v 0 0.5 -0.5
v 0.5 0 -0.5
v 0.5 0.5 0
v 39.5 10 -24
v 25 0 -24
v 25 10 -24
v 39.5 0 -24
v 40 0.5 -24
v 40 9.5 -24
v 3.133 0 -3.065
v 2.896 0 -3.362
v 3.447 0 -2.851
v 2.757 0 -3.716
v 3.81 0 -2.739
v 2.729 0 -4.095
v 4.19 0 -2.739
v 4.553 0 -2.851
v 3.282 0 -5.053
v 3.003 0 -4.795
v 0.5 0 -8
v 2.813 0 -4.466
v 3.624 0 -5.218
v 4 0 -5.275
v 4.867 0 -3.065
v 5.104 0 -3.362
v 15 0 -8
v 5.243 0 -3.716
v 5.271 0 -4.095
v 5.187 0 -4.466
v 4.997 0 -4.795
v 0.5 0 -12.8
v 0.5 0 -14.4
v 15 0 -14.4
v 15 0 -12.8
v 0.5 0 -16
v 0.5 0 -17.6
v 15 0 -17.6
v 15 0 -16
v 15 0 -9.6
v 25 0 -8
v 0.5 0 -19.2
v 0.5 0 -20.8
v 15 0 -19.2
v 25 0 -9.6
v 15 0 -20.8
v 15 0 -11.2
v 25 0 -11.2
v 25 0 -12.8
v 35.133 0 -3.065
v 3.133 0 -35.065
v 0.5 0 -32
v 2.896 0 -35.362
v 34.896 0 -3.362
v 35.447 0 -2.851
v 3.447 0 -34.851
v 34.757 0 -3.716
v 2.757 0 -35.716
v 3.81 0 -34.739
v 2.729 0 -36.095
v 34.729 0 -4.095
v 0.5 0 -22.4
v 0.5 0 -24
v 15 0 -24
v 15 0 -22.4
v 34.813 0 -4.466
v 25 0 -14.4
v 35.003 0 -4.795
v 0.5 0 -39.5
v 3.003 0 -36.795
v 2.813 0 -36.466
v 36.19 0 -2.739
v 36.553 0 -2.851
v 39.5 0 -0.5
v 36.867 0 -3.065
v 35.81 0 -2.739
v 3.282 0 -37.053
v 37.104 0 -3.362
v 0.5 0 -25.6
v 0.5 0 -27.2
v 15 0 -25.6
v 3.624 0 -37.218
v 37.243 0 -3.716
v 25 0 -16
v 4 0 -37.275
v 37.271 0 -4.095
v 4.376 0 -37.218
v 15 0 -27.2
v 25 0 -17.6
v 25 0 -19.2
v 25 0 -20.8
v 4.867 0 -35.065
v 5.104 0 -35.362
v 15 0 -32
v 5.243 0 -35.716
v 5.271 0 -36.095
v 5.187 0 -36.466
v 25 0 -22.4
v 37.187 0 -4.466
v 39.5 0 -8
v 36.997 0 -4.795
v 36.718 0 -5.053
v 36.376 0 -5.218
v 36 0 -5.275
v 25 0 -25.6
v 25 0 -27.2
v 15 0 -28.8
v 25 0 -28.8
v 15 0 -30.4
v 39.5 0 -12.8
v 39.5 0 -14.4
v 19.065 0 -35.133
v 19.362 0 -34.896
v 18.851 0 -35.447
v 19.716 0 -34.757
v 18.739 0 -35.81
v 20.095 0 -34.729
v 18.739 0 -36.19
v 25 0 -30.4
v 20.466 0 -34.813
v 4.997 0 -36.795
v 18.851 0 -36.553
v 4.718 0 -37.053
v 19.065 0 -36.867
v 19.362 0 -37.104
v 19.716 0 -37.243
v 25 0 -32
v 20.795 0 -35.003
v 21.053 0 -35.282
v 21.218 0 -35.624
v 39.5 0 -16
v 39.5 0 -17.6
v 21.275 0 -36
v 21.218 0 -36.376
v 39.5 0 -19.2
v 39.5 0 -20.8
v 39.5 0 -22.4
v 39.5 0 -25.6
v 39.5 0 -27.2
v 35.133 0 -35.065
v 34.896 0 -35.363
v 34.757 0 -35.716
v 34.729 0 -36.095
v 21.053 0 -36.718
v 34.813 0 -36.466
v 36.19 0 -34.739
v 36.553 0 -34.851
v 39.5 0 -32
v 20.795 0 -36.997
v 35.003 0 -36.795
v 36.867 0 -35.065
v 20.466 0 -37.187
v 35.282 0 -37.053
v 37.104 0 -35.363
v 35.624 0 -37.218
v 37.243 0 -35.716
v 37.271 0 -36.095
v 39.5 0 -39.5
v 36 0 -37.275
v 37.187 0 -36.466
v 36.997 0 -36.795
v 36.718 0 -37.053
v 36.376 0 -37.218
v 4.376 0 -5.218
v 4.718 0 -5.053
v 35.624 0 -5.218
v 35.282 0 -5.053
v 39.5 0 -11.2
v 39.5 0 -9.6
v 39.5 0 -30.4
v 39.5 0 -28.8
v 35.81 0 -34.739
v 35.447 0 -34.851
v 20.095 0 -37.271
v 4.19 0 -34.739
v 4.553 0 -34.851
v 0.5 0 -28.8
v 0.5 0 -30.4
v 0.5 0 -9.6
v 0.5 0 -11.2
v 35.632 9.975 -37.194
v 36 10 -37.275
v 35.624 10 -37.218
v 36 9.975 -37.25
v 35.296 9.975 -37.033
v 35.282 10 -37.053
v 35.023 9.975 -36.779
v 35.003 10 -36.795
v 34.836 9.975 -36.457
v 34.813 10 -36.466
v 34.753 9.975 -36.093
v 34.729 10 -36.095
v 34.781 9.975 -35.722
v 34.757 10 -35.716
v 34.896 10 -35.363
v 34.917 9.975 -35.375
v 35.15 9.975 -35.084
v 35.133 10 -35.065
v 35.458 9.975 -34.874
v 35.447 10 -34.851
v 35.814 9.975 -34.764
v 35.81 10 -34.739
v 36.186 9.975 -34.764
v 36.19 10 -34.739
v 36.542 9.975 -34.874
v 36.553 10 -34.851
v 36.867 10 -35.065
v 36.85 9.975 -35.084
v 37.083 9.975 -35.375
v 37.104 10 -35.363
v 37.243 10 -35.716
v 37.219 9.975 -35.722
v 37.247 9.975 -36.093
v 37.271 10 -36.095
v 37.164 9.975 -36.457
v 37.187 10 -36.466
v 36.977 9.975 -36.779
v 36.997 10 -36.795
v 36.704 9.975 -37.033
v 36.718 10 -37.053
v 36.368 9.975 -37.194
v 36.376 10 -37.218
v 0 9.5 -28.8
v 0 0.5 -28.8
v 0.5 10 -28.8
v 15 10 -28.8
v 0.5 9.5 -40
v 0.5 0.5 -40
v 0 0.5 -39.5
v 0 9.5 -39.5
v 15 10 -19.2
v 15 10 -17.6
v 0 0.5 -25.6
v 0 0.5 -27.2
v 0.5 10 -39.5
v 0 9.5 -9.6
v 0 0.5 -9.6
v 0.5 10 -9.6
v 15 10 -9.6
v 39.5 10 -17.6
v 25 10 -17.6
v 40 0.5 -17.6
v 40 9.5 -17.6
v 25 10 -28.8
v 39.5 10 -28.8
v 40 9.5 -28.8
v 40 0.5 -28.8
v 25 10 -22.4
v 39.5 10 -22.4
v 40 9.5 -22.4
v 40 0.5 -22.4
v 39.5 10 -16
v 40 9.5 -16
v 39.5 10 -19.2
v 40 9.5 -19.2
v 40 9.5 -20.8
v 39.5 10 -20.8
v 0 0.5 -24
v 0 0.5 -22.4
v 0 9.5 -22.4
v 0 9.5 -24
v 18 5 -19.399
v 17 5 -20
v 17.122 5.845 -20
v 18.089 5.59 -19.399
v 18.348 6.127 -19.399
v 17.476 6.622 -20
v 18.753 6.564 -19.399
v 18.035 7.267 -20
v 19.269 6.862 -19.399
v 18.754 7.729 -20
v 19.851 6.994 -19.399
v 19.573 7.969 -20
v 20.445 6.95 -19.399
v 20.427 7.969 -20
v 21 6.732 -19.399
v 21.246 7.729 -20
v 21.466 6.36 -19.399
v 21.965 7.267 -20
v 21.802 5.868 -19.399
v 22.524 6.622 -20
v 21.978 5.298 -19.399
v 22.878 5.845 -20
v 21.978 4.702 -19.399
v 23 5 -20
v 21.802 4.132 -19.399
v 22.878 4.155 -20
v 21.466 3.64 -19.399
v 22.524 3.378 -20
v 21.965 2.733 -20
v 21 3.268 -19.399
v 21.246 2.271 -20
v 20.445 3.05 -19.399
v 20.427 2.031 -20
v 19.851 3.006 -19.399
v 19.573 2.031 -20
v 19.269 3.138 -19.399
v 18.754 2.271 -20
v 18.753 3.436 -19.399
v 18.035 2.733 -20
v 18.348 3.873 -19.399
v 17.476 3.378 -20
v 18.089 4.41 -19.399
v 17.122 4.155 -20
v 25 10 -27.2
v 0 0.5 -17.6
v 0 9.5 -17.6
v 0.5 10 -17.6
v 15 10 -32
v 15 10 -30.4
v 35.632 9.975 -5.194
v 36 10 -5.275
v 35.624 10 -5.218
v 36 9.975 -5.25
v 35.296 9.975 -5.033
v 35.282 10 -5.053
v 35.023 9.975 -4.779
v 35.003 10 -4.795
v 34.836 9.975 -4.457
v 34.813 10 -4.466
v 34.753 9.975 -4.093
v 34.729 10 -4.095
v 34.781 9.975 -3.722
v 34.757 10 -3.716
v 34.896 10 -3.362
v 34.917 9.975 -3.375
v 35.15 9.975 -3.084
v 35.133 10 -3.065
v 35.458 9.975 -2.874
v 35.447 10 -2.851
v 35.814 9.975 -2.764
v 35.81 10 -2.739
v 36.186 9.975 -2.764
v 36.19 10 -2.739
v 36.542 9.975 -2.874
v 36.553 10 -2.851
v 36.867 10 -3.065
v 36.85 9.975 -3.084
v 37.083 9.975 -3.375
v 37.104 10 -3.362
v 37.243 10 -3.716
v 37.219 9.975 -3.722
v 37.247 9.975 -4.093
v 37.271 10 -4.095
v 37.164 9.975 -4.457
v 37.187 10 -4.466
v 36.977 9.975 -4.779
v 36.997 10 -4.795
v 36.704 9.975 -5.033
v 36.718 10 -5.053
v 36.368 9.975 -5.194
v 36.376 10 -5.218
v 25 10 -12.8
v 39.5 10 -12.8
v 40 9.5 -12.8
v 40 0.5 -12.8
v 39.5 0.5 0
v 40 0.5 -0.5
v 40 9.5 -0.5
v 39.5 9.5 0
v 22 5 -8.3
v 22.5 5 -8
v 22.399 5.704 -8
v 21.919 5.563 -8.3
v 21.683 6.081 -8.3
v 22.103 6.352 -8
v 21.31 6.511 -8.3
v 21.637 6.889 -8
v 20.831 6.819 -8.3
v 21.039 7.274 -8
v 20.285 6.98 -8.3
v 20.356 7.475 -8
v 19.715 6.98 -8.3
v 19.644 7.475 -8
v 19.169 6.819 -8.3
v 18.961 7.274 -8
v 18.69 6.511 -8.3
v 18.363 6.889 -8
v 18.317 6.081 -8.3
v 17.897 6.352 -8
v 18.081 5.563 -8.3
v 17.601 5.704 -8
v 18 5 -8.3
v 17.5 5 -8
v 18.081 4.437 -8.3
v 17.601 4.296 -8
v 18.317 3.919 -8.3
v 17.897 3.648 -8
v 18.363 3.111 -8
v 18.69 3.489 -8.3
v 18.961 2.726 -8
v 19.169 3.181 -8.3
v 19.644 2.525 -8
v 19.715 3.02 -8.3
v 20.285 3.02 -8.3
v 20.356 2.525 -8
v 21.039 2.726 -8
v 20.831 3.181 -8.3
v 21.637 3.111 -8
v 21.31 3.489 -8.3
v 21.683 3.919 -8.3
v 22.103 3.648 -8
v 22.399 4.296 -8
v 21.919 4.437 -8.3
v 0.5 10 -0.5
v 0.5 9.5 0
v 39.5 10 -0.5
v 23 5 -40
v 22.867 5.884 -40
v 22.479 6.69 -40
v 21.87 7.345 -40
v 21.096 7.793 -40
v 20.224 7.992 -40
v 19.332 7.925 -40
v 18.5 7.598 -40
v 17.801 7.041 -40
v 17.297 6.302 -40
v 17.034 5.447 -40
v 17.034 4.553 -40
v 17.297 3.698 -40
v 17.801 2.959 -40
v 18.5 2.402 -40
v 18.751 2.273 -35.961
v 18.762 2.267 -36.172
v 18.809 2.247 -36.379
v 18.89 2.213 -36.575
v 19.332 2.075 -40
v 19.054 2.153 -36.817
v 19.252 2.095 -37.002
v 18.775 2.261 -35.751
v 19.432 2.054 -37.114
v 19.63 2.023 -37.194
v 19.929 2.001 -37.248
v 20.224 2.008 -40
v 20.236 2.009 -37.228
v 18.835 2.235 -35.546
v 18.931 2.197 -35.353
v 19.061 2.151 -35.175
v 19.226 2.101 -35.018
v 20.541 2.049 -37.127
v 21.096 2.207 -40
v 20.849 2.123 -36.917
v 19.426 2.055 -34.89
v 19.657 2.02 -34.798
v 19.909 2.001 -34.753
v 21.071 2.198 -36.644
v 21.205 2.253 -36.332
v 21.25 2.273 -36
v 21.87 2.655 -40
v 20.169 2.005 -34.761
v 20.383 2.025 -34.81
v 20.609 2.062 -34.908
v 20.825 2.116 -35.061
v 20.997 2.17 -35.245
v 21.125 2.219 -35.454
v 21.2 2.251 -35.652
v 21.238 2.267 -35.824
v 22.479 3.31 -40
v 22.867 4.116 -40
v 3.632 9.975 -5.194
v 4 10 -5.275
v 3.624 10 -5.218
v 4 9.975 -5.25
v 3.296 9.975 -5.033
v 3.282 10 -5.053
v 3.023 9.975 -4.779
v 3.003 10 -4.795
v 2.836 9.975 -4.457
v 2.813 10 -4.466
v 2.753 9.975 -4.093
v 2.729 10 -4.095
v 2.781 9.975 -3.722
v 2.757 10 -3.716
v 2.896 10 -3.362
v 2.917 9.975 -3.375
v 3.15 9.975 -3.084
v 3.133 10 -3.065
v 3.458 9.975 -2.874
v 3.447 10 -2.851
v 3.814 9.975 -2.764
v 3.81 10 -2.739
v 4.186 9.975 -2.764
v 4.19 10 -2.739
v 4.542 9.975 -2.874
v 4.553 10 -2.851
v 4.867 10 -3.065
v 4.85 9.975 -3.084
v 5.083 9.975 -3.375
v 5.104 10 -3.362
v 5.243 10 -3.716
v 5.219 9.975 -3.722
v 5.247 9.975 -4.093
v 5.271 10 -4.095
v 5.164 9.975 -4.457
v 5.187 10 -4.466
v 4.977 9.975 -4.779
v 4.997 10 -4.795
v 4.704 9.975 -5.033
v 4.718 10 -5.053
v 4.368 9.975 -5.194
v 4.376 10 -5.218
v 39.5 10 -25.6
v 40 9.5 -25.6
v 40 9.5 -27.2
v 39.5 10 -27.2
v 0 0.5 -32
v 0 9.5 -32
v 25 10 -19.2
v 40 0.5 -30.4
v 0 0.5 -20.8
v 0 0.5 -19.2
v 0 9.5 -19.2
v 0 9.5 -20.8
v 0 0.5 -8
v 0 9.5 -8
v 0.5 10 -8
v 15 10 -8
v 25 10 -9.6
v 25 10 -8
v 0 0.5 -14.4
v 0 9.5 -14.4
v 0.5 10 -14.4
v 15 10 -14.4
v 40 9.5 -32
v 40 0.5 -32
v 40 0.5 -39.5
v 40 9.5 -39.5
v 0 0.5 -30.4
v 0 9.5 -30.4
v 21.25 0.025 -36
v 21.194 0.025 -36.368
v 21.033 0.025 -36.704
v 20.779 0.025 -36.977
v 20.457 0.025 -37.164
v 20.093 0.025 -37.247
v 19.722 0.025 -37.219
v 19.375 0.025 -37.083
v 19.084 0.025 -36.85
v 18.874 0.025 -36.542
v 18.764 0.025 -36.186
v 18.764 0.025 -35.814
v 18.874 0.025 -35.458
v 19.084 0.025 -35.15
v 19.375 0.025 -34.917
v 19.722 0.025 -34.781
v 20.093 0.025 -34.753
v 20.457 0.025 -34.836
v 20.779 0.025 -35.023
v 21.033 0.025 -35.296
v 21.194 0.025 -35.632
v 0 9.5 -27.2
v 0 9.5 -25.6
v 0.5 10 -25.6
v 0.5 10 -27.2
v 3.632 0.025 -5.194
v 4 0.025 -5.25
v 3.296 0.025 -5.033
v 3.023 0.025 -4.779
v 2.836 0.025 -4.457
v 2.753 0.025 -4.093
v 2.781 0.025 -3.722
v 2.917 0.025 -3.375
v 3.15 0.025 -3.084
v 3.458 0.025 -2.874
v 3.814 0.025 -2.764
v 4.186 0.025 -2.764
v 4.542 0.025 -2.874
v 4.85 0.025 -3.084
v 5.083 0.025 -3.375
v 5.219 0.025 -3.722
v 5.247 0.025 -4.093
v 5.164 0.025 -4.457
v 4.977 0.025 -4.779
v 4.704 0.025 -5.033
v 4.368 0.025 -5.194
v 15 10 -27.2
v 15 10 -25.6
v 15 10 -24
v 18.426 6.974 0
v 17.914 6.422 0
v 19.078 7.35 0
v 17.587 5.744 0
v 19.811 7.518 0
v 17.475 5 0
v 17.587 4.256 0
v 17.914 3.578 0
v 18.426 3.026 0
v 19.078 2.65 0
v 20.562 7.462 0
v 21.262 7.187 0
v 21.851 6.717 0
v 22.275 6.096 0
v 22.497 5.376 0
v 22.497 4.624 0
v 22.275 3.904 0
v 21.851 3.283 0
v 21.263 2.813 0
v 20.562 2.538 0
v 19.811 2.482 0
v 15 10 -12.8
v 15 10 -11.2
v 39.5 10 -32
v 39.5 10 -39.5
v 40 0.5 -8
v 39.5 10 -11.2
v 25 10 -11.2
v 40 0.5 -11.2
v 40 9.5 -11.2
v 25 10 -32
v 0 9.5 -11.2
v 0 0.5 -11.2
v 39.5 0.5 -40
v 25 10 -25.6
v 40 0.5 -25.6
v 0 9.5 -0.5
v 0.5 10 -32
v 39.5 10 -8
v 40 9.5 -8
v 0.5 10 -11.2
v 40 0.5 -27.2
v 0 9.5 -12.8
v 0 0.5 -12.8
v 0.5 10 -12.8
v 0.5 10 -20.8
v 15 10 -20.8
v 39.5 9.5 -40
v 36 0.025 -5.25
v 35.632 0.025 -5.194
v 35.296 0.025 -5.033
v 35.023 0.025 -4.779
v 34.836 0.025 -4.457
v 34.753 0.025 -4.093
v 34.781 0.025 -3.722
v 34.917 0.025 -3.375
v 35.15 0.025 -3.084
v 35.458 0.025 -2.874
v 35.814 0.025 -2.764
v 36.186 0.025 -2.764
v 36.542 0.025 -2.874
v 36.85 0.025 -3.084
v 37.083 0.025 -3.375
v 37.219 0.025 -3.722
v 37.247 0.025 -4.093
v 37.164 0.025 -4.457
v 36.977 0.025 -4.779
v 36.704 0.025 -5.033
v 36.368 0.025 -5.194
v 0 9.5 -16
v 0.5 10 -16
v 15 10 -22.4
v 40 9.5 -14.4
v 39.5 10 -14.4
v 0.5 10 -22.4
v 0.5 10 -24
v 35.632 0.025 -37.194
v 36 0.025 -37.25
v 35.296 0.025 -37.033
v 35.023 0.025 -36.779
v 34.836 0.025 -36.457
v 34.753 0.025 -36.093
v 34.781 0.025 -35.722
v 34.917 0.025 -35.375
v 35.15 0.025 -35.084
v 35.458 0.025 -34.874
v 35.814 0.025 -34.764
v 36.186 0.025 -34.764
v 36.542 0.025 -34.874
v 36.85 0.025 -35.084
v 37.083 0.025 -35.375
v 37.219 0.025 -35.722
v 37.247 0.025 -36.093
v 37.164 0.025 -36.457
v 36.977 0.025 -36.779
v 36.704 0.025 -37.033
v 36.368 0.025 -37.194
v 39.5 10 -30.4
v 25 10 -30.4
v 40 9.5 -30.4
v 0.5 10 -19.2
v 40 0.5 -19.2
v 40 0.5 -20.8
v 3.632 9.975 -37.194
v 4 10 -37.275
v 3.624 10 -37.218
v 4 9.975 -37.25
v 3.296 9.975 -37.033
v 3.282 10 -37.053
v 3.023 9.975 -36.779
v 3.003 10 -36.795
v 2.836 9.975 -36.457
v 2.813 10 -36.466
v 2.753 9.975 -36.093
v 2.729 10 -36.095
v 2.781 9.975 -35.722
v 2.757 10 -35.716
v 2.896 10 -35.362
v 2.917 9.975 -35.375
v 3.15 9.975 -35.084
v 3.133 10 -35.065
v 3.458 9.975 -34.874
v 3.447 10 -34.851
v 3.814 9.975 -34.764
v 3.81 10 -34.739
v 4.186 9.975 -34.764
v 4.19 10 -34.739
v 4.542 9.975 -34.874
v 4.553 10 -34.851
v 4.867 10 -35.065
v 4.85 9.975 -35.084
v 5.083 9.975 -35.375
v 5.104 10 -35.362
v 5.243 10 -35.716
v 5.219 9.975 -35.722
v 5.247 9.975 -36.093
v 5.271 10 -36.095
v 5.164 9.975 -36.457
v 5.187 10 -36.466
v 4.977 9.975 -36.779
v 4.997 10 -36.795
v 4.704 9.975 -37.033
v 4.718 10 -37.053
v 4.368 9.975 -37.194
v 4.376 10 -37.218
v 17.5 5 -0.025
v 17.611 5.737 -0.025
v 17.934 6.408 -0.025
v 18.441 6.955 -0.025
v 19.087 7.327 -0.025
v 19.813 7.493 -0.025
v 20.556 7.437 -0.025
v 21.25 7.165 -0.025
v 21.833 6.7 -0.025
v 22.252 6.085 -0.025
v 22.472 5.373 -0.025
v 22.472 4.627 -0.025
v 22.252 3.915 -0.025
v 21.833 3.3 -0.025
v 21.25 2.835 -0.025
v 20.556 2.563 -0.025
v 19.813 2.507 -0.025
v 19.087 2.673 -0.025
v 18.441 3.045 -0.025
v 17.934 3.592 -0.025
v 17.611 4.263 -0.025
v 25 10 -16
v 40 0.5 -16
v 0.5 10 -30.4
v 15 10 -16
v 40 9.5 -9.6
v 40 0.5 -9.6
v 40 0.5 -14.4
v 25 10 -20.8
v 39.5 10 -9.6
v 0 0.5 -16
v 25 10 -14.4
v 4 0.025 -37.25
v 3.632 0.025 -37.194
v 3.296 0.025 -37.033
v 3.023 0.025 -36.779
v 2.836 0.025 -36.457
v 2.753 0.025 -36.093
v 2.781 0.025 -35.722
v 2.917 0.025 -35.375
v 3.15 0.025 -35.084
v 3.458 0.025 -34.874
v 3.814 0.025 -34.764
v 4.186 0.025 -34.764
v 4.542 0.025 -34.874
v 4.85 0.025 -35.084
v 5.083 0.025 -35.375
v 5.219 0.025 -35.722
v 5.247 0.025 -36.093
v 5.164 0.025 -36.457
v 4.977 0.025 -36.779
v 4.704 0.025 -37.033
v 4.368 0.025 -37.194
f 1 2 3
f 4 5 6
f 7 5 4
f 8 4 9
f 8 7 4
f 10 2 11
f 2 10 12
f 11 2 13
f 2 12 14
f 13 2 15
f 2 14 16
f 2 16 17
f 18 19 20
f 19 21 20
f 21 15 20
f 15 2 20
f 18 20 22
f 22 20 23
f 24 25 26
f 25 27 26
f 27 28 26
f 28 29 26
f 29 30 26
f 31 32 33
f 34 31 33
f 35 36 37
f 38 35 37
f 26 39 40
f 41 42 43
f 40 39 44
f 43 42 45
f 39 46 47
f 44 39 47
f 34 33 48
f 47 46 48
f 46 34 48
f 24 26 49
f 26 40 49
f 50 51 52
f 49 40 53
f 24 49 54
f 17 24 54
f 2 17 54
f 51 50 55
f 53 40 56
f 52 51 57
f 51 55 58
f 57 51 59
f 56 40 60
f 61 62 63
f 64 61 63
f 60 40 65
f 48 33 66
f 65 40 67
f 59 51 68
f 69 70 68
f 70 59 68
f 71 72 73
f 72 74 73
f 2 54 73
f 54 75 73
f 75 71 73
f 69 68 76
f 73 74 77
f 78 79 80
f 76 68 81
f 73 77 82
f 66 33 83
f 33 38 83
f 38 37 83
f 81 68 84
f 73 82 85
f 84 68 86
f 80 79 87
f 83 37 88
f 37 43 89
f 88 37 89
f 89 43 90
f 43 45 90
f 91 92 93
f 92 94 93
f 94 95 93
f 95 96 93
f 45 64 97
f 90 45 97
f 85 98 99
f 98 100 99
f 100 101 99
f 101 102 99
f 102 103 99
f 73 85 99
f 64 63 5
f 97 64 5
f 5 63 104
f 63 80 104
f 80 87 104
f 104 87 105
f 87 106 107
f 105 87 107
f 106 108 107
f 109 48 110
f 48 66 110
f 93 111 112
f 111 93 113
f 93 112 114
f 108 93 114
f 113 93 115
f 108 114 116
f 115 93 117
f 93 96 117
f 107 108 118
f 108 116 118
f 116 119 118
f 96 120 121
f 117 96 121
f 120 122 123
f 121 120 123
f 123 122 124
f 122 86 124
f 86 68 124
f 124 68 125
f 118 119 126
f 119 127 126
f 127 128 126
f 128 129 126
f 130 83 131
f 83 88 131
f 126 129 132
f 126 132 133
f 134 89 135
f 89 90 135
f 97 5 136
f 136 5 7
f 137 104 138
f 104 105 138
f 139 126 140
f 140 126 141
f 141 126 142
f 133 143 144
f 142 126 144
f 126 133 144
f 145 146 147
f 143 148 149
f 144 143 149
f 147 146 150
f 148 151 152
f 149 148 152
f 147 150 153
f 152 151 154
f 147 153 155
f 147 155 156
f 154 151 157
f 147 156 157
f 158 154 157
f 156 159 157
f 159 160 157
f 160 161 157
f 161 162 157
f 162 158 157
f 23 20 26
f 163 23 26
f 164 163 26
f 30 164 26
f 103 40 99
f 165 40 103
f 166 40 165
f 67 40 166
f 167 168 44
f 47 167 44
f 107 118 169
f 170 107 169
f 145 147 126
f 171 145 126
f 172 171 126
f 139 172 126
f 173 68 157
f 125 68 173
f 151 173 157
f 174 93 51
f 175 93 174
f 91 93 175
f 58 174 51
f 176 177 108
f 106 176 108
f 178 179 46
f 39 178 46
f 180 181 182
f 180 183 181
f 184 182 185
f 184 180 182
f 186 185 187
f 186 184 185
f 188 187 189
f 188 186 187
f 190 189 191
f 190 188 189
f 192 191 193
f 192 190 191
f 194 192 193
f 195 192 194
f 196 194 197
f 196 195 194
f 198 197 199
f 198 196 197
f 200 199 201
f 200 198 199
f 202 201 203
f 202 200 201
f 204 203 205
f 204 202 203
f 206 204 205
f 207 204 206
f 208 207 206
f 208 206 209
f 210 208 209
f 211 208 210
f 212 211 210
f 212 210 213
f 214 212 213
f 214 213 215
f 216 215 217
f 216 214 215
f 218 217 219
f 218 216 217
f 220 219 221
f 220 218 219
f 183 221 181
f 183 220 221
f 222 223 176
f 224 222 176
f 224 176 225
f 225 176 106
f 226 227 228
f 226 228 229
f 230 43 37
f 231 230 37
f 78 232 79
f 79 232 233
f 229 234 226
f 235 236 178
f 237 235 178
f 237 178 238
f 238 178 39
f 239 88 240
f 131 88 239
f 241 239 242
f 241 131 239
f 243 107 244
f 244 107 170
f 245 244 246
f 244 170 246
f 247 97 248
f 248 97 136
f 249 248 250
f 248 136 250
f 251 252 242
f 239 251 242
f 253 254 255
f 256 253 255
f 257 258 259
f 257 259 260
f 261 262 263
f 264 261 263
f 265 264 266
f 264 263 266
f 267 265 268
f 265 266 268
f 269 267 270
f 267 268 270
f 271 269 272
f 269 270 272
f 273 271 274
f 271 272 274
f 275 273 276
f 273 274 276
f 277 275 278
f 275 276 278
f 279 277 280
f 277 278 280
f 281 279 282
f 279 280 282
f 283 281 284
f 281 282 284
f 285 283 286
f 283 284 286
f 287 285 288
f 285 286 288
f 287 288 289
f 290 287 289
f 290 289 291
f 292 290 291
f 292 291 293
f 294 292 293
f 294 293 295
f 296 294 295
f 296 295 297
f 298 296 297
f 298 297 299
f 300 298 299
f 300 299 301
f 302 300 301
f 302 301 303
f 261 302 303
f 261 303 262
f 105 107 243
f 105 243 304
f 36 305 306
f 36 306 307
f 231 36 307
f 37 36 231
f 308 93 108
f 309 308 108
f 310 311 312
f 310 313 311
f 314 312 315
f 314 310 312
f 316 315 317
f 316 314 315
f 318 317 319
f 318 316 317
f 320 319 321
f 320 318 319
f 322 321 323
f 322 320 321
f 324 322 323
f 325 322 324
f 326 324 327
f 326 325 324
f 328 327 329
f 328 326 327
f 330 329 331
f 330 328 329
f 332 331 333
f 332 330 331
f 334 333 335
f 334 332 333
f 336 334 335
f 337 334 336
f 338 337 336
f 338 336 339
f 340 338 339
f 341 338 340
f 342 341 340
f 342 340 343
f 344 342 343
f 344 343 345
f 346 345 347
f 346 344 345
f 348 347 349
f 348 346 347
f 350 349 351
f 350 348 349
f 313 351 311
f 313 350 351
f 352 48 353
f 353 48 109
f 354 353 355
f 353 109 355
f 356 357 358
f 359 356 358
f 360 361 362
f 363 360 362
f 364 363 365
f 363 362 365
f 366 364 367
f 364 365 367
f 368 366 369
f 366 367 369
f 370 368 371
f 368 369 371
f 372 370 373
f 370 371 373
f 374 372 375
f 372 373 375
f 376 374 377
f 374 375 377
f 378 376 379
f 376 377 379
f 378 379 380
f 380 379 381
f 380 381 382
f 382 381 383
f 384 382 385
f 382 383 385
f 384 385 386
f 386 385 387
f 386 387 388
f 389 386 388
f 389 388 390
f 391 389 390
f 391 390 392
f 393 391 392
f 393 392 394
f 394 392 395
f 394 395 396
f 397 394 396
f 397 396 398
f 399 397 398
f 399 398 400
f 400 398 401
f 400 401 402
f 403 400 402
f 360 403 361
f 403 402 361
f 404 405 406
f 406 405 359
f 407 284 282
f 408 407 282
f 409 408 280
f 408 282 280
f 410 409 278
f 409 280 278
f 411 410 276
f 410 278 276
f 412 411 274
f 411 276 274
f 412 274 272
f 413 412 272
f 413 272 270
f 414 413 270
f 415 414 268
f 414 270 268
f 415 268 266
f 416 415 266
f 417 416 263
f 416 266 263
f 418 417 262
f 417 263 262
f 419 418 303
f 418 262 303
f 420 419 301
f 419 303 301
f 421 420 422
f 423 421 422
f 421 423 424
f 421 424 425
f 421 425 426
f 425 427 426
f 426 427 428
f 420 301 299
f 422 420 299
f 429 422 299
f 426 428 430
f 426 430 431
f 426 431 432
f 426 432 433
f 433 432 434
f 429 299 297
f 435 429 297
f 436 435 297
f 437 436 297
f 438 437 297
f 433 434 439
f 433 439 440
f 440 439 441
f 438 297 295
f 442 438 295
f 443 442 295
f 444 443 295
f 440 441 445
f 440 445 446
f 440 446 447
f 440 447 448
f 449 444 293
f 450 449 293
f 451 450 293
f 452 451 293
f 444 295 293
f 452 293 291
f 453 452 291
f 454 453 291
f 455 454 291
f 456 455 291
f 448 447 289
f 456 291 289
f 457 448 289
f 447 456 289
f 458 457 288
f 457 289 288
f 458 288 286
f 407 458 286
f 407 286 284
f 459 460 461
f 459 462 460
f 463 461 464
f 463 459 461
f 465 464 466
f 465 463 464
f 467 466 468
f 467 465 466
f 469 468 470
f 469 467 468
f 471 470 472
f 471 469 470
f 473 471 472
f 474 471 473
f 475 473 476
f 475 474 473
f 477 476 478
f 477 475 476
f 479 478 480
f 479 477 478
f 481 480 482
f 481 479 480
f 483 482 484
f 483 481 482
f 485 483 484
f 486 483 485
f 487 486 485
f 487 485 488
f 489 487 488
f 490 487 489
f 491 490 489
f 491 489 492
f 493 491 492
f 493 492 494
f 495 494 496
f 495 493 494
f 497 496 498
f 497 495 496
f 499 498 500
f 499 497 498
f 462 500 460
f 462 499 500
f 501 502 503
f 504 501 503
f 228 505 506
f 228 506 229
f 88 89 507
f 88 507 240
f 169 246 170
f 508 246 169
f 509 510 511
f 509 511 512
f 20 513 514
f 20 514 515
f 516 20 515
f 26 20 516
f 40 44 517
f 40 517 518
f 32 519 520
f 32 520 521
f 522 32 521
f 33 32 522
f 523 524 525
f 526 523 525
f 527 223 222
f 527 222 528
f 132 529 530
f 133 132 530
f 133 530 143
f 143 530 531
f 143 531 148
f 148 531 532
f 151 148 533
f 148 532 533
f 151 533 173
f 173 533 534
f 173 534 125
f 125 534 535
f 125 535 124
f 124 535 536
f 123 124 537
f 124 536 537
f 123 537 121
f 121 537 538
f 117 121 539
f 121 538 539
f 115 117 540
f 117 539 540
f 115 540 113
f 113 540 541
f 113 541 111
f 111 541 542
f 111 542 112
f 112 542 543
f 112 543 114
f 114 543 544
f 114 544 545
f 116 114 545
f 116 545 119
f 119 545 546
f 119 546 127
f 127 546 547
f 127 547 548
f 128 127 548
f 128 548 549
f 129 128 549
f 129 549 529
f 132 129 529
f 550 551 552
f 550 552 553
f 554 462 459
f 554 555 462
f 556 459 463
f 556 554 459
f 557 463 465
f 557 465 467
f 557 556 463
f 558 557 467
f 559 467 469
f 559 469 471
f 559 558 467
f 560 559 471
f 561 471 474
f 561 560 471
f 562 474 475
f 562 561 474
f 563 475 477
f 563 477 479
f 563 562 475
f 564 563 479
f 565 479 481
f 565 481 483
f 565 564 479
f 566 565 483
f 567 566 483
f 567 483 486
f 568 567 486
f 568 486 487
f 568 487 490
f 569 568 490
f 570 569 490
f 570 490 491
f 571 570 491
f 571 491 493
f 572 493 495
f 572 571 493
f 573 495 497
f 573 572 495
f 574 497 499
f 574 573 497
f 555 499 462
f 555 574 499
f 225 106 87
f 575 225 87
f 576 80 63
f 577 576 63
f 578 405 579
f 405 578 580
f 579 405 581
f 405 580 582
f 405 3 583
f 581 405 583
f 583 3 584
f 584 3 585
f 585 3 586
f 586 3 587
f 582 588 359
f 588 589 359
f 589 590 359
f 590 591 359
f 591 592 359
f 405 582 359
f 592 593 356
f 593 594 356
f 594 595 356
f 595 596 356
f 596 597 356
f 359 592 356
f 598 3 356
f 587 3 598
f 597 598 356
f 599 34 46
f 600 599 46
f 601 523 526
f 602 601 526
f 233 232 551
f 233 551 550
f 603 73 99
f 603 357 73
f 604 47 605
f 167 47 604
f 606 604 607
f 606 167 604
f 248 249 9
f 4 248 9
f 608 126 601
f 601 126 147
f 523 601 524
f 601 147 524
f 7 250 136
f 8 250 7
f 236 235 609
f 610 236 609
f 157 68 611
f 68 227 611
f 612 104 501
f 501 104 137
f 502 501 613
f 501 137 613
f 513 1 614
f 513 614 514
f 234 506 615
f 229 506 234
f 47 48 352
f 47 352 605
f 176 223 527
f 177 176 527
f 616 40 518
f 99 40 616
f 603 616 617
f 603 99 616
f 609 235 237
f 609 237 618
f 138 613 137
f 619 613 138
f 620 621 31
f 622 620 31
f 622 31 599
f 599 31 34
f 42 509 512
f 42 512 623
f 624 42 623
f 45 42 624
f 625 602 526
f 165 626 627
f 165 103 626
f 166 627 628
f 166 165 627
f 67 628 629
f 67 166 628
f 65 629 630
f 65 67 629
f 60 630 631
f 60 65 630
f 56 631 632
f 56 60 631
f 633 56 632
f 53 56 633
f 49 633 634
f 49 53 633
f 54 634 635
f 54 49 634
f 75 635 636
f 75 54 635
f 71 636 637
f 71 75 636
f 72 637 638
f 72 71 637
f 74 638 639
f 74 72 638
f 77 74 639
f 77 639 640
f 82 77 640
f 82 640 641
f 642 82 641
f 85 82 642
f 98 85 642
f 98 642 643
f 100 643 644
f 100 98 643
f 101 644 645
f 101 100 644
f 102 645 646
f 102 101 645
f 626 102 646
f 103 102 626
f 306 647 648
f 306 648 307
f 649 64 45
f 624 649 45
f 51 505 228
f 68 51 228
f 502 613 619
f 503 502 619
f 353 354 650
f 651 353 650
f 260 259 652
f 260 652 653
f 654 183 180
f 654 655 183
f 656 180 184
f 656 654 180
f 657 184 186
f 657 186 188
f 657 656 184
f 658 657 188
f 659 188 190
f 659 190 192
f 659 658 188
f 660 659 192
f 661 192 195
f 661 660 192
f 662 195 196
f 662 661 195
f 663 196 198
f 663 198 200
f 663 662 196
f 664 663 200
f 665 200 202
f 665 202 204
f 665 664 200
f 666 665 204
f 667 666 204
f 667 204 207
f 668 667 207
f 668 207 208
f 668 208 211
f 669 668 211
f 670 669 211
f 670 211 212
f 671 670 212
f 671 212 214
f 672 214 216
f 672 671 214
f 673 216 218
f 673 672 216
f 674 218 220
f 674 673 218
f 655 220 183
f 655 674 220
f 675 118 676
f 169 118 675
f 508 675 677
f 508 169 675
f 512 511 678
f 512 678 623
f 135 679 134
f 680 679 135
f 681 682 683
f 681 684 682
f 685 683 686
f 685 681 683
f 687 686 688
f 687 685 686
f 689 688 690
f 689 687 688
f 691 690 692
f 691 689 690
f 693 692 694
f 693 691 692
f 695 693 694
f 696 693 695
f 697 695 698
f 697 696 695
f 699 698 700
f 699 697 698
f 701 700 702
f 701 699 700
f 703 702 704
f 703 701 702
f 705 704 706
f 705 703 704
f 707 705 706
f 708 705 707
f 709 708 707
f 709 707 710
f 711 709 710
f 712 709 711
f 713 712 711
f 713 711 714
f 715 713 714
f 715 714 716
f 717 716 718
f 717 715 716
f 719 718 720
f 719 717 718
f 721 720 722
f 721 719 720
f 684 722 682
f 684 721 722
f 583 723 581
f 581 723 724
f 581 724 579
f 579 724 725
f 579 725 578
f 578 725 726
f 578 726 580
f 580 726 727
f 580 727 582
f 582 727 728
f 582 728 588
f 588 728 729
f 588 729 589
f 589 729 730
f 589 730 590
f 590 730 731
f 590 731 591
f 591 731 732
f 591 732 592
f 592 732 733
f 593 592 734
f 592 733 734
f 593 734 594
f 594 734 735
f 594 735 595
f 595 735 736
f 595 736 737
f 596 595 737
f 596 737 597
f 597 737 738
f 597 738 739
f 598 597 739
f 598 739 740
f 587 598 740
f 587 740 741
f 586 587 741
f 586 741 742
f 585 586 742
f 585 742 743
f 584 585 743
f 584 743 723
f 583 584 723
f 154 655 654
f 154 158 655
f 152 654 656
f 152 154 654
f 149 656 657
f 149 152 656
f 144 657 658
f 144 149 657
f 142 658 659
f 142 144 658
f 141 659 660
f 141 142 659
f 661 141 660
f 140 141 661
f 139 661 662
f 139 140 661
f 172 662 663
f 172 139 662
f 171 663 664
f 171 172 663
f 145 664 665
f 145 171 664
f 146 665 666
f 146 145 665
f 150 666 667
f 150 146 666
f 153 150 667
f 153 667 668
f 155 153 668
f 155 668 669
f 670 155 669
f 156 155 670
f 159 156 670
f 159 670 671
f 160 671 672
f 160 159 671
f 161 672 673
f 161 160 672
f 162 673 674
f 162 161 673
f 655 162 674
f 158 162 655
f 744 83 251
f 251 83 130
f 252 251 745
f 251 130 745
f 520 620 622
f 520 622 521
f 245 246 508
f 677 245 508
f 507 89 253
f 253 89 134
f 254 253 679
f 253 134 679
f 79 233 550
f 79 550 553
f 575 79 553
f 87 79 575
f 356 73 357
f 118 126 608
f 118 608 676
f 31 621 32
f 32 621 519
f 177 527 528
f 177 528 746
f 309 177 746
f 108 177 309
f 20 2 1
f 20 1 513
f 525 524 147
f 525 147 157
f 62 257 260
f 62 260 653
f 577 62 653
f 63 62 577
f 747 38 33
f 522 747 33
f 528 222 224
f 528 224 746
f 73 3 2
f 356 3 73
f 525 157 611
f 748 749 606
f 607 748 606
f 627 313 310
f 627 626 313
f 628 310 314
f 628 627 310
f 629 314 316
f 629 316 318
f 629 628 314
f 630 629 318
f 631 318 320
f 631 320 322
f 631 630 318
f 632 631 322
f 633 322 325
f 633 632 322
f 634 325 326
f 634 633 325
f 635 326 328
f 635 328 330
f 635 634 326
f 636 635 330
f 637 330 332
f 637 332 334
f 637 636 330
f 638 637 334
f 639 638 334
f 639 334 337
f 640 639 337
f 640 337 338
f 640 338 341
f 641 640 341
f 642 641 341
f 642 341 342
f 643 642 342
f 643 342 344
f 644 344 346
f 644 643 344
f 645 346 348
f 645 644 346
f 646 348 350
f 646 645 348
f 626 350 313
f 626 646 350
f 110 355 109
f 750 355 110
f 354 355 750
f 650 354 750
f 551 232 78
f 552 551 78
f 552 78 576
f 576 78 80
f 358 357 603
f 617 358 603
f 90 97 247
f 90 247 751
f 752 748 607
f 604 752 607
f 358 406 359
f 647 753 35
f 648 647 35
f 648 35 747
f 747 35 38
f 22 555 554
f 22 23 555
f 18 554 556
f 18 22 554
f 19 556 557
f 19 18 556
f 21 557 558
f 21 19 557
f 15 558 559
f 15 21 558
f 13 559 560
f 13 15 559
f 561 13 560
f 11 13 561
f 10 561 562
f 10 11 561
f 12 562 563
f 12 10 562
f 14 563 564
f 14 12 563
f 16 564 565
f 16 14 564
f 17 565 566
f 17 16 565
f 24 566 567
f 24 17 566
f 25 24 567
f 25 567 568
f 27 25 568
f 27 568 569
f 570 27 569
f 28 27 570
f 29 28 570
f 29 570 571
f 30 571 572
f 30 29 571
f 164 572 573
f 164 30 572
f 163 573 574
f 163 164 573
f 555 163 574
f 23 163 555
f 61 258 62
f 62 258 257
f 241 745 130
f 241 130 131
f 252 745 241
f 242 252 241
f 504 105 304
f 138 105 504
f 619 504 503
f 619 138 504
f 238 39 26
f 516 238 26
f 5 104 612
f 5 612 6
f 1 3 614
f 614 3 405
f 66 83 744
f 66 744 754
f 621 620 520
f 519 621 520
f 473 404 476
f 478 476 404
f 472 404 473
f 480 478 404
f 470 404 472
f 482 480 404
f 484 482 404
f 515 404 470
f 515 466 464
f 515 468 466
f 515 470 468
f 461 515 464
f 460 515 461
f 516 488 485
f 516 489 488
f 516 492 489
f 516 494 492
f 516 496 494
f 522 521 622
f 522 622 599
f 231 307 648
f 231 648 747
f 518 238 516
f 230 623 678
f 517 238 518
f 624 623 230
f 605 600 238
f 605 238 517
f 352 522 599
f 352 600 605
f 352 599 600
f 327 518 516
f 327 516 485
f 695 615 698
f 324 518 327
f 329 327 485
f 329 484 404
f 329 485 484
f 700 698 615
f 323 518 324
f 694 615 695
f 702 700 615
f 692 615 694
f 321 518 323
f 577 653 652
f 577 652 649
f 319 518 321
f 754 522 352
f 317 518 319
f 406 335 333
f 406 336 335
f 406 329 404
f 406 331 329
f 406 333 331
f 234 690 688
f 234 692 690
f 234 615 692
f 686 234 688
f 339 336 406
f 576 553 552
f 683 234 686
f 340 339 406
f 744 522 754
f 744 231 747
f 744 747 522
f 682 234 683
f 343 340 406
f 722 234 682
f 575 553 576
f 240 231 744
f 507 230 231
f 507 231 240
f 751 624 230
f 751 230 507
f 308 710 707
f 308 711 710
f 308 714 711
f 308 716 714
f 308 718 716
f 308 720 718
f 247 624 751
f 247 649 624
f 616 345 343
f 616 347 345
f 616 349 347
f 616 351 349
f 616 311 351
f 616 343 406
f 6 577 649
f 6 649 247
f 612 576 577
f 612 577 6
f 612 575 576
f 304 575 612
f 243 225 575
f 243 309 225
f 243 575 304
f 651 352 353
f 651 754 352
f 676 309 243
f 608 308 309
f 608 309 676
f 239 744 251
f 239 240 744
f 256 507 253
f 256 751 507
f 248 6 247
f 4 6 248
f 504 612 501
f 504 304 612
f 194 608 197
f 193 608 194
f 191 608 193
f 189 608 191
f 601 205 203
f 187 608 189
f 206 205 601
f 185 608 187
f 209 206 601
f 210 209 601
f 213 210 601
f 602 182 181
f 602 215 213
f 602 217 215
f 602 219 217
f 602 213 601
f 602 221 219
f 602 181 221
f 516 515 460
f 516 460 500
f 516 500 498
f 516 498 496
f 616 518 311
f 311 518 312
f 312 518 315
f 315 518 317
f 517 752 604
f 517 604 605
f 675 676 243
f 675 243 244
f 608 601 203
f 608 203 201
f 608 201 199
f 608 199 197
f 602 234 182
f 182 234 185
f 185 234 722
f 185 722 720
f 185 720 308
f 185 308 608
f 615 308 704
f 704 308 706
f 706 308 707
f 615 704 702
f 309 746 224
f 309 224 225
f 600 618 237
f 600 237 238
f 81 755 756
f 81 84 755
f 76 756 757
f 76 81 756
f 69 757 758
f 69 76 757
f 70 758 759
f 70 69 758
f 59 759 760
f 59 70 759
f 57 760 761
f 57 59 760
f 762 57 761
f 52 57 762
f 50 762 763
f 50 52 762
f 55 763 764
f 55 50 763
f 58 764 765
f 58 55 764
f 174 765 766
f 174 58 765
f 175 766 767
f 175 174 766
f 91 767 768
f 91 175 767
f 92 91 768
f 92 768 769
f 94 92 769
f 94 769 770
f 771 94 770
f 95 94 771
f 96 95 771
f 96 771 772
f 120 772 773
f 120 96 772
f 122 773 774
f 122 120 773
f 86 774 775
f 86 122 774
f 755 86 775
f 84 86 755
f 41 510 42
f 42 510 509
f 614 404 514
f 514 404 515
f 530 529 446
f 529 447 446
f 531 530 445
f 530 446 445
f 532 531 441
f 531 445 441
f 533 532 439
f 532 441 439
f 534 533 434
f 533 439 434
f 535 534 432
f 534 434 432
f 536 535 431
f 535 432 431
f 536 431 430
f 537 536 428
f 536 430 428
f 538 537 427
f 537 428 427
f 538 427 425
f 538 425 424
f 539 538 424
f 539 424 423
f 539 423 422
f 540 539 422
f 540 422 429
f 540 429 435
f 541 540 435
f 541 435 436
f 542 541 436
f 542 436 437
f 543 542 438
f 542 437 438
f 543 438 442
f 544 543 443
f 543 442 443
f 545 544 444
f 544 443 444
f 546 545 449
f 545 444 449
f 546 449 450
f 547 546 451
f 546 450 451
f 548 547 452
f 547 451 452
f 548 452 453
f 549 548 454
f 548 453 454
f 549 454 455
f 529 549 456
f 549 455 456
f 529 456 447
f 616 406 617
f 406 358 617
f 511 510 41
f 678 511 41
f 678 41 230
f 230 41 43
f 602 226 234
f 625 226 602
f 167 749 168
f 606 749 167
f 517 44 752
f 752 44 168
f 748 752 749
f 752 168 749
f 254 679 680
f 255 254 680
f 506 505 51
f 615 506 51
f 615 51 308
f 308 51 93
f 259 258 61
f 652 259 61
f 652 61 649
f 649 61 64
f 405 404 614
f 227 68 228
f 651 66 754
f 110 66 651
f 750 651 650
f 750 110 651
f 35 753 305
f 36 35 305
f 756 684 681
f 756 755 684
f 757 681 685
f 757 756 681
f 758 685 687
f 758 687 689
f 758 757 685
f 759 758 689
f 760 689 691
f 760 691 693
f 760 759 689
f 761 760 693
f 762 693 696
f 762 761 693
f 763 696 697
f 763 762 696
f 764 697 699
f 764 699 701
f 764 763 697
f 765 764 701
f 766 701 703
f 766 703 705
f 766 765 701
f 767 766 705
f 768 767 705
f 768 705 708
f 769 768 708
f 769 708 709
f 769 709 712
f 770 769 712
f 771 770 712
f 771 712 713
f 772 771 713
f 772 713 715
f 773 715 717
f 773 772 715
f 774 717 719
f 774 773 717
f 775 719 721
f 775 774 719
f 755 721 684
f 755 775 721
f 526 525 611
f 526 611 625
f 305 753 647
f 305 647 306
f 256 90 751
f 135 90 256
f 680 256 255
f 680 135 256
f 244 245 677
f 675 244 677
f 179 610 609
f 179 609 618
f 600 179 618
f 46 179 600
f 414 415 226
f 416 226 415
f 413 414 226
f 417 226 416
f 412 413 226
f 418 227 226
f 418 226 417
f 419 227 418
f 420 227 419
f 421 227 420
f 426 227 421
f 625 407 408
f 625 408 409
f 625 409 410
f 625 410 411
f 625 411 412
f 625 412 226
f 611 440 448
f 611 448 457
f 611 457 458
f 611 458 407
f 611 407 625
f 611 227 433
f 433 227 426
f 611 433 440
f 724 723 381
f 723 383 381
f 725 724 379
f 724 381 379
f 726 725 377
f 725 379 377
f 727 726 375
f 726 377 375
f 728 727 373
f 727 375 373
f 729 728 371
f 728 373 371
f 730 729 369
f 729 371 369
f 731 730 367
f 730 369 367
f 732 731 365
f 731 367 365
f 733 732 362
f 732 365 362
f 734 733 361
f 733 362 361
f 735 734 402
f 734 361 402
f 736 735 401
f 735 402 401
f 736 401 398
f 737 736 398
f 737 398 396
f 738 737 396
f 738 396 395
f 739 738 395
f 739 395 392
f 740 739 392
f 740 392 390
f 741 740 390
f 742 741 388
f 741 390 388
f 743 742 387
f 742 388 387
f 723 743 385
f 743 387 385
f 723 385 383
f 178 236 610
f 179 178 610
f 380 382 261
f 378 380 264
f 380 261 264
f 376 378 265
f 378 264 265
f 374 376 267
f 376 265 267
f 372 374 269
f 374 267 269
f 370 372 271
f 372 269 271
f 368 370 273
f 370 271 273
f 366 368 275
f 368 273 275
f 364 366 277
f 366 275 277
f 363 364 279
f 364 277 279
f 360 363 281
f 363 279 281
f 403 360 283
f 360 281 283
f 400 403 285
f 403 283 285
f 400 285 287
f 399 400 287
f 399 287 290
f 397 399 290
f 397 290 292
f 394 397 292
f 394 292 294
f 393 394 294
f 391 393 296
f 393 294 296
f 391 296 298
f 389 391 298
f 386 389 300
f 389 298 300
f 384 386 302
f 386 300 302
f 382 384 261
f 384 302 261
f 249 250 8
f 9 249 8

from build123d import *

# Parameters (mm, degrees)
ESQUISSE1_W                                         = 40
ESQUISSE1_H                                         = 40
BOSS_EXTRU_1_DEPTH                                  = 10
DIAM_TRE_DU_PER_AGE_4_0_4_1_D                       = 4
TROU_POUR_TARAUDAGE_POUR_TROU_TARAUD_M6_D           = 5
TROU_POUR_TARAUDAGE_POUR_TROU_TARAUD_M6_DEPTH       = 8
TROU_POUR_TARAUDAGE_POUR_TROU_TARAUD_M6_CSINK_D     = 5.05
TROU_POUR_TARAUDAGE_POUR_TROU_TARAUD_M6_CSINK_ANGLE = 90
TROU_POUR_TARAUDAGE_POUR_TROU_TARAUD_M6_TIP         = 1.502151548
DIAM_TRE_DU_PER_AGE_6_0_6_1_D                       = 6
DIAM_TRE_DU_PER_AGE_6_0_6_1_DEPTH                   = 20
DIAM_TRE_DU_PER_AGE_6_0_6_1_TIP                     = 1.802581857
TROU_POUR_TARAUDAGE_POUR_TROU_TARAUD_2_COUNT        = 2
TROU_POUR_TARAUDAGE_POUR_TROU_TARAUD_2_PITCH        = 32
TROU_POUR_TARAUDAGE_POUR_TROU_TARAUD_3_COUNT        = 2
TROU_POUR_TARAUDAGE_POUR_TROU_TARAUD_3_PITCH        = 45.254833996
TROU_POUR_TARAUDAGE_POUR_TROU_TARAUD_4_COUNT        = 2
TROU_POUR_TARAUDAGE_POUR_TROU_TARAUD_4_PITCH        = 32
TROU_POUR_TARAUDAGE_POUR_TROU_TARAUD_5_D            = 2.5
TROU_POUR_TARAUDAGE_POUR_TROU_TARAUD_5_DEPTH        = 5
TROU_POUR_TARAUDAGE_POUR_TROU_TARAUD_5_CSINK_D      = 2.55
TROU_POUR_TARAUDAGE_POUR_TROU_TARAUD_5_CSINK_ANGLE  = 90
TROU_POUR_TARAUDAGE_POUR_TROU_TARAUD_5_TIP          = 0.751075774
ESQUISSE21_W                                        = 15
ESQUISSE21_H                                        = 1.6
ENL_V_MAT_EXTRU_1_DEPTH                             = 58.445626535
R_P_TITION_LIN_AIRE1_COUNT                          = 8
R_P_TITION_LIN_AIRE1_PITCH                          = 3.2
CHANFREIN1_SIZE                                     = 0.5


with BuildPart() as part:
    # Esquisse1 → Boss.-Extru.1 (new body)
    with BuildSketch(Plane(origin=(0, 0, 0), x_dir=(1, 0, 0), z_dir=(0, 1, 0))):
        with Locations((20, 20)):
            Rectangle(ESQUISSE1_W, ESQUISSE1_H)
    extrude(amount=BOSS_EXTRU_1_DEPTH)

    # Diamètre du perçage Ø4.0 (4)1 (through all)
    with Locations(Plane.XY):
        with Locations((20, 5)):
            Hole(DIAM_TRE_DU_PER_AGE_4_0_4_1_D / 2)

    # Trou pour taraudage pour trou taraudé M61
    with Locations(Plane.XY):
        with Locations((20, 5)):
            CounterSinkHole(TROU_POUR_TARAUDAGE_POUR_TROU_TARAUD_M6_D / 2, TROU_POUR_TARAUDAGE_POUR_TROU_TARAUD_M6_CSINK_D / 2, depth=TROU_POUR_TARAUDAGE_POUR_TROU_TARAUD_M6_DEPTH, counter_sink_angle=TROU_POUR_TARAUDAGE_POUR_TROU_TARAUD_M6_CSINK_ANGLE)
            with Locations((0, 0, -(TROU_POUR_TARAUDAGE_POUR_TROU_TARAUD_M6_DEPTH + TROU_POUR_TARAUDAGE_POUR_TROU_TARAUD_M6_TIP / 2))):  # 118° drill point
                Cone(0, TROU_POUR_TARAUDAGE_POUR_TROU_TARAUD_M6_D / 2, TROU_POUR_TARAUDAGE_POUR_TROU_TARAUD_M6_TIP, mode=Mode.SUBTRACT)

    # Diamètre du perçage Ø6.0 (6)1
    with Locations(Plane(origin=(0, 0, -40), x_dir=(-1, 0, 0), z_dir=(0, 0, -1))):
        with Locations((-20, 5)):
            Hole(DIAM_TRE_DU_PER_AGE_6_0_6_1_D / 2, depth=DIAM_TRE_DU_PER_AGE_6_0_6_1_DEPTH)
            with Locations((0, 0, -(DIAM_TRE_DU_PER_AGE_6_0_6_1_DEPTH + DIAM_TRE_DU_PER_AGE_6_0_6_1_TIP / 2))):  # 118° drill point
                Cone(0, DIAM_TRE_DU_PER_AGE_6_0_6_1_D / 2, DIAM_TRE_DU_PER_AGE_6_0_6_1_TIP, mode=Mode.SUBTRACT)

    # Esquisse17 → Trou pour taraudage pour trou taraud_ M3 (revolve, cut)
    with BuildSketch(Plane(origin=(4, 0, -4), x_dir=(0, 0, -1), z_dir=(1, 0, 0))):
        Polygon((0, 0), (0, 10), (1.275, 10), (1.25, 9.975), (1.25, 0.025), (1.275, 0), align=None)
    trou_pour_taraudage_pour_trou_taraud_m3 = revolve(axis=Axis((4, -6.35, -4), (0, 1, 0)), mode=Mode.SUBTRACT)

    # Trou pour taraudage pour trou taraud 2: Trou pour taraudage pour trou taraud_ M3 ×2
    with Locations(*[(i * TROU_POUR_TARAUDAGE_POUR_TROU_TARAUD_2_PITCH, 0, 0) for i in range(1, TROU_POUR_TARAUDAGE_POUR_TROU_TARAUD_2_COUNT)]):
        add(trou_pour_taraudage_pour_trou_taraud_m3, mode=Mode.SUBTRACT)

    # Trou pour taraudage pour trou taraud 3: Trou pour taraudage pour trou taraud_ M3 ×2
    with Locations(*[Vector(0.7071067811865475, 0, -0.7071067811865476) * (i * TROU_POUR_TARAUDAGE_POUR_TROU_TARAUD_3_PITCH) for i in range(1, TROU_POUR_TARAUDAGE_POUR_TROU_TARAUD_3_COUNT)]):
        add(trou_pour_taraudage_pour_trou_taraud_m3, mode=Mode.SUBTRACT)

    # Trou pour taraudage pour trou taraud 4: Trou pour taraudage pour trou taraud_ M3 ×2
    with Locations(*[(0, 0, -i * TROU_POUR_TARAUDAGE_POUR_TROU_TARAUD_4_PITCH) for i in range(1, TROU_POUR_TARAUDAGE_POUR_TROU_TARAUD_4_COUNT)]):
        add(trou_pour_taraudage_pour_trou_taraud_m3, mode=Mode.SUBTRACT)

    # Trou pour taraudage pour trou taraud 5
    with Locations(Plane(origin=(0, 0, 0), x_dir=(-1, 0, 0), z_dir=(0, -1, 0))):
        with Locations((-20, 36)):
            CounterSinkHole(TROU_POUR_TARAUDAGE_POUR_TROU_TARAUD_5_D / 2, TROU_POUR_TARAUDAGE_POUR_TROU_TARAUD_5_CSINK_D / 2, depth=TROU_POUR_TARAUDAGE_POUR_TROU_TARAUD_5_DEPTH, counter_sink_angle=TROU_POUR_TARAUDAGE_POUR_TROU_TARAUD_5_CSINK_ANGLE)
            with Locations((0, 0, -(TROU_POUR_TARAUDAGE_POUR_TROU_TARAUD_5_DEPTH + TROU_POUR_TARAUDAGE_POUR_TROU_TARAUD_5_TIP / 2))):  # 118° drill point
                Cone(0, TROU_POUR_TARAUDAGE_POUR_TROU_TARAUD_5_D / 2, TROU_POUR_TARAUDAGE_POUR_TROU_TARAUD_5_TIP, mode=Mode.SUBTRACT)

    # Esquisse21 → Enlèv. mat.-Extru.1 (cut, through all)
    with BuildSketch(Plane.XZ):
        with Locations((7.5, -8.8)):
            Rectangle(ESQUISSE21_W, ESQUISSE21_H)
        with Locations((32.5, -8.8)):
            Rectangle(ESQUISSE21_W, ESQUISSE21_H)
    enl_v_mat_extru_1 = extrude(amount=-ENL_V_MAT_EXTRU_1_DEPTH, mode=Mode.SUBTRACT)

    # Répétition linéaire1: Enlèv. mat.-Extru.1 ×8
    with Locations(*[(0, 0, -i * R_P_TITION_LIN_AIRE1_PITCH) for i in range(1, R_P_TITION_LIN_AIRE1_COUNT)]):
        add(enl_v_mat_extru_1, mode=Mode.SUBTRACT)

    # Chanfrein1
    chanfrein1_edges = [part.edges().sort_by_distance(p)[0] for p in [
        (40, 10, -4),
        (0, 0, -10.4),
        (0, 10, -10.4),
        (40, 0, -13.6),
        (40, 10, -13.6),
        (20, 10, -40),
        (0, 0, -13.6),
        (0, 10, -13.6),
        (40, 0, -16.8),
        (40, 10, -16.8),
        (0, 0, -16.8),
        (0, 10, -16.8),
        (40, 0, -20),
        (40, 10, -20),
        (0, 0, -20),
        (0, 10, -20),
        (40, 0, -23.2),
        (40, 10, -23.2),
        (0, 0, -23.2),
        (0, 10, -23.2),
        (40, 0, -26.4),
        (40, 10, -26.4),
        (0, 0, -26.4),
        (0, 10, -26.4),
        (40, 0, -29.6),
        (40, 10, -29.6),
        (0, 0, -29.6),
        (0, 10, -29.6),
        (40, 0, -36),
        (40, 10, -36),
        (0, 10, -36),
        (20, 0, -40),
        (40, 0, -4),
        (20, 0, 0),
        (0, 0, -36),
        (20, 10, 0),
        (0, 0, -4),
        (0, 5, -40),
        (40, 5, -40),
        (0, 10, -4),
        (40, 5, 0),
        (0, 5, 0),
        (40, 0, -10.4),
        (40, 10, -10.4),
    ]]
    chamfer(chanfrein1_edges, length=CHANFREIN1_SIZE)


solid = part.part
